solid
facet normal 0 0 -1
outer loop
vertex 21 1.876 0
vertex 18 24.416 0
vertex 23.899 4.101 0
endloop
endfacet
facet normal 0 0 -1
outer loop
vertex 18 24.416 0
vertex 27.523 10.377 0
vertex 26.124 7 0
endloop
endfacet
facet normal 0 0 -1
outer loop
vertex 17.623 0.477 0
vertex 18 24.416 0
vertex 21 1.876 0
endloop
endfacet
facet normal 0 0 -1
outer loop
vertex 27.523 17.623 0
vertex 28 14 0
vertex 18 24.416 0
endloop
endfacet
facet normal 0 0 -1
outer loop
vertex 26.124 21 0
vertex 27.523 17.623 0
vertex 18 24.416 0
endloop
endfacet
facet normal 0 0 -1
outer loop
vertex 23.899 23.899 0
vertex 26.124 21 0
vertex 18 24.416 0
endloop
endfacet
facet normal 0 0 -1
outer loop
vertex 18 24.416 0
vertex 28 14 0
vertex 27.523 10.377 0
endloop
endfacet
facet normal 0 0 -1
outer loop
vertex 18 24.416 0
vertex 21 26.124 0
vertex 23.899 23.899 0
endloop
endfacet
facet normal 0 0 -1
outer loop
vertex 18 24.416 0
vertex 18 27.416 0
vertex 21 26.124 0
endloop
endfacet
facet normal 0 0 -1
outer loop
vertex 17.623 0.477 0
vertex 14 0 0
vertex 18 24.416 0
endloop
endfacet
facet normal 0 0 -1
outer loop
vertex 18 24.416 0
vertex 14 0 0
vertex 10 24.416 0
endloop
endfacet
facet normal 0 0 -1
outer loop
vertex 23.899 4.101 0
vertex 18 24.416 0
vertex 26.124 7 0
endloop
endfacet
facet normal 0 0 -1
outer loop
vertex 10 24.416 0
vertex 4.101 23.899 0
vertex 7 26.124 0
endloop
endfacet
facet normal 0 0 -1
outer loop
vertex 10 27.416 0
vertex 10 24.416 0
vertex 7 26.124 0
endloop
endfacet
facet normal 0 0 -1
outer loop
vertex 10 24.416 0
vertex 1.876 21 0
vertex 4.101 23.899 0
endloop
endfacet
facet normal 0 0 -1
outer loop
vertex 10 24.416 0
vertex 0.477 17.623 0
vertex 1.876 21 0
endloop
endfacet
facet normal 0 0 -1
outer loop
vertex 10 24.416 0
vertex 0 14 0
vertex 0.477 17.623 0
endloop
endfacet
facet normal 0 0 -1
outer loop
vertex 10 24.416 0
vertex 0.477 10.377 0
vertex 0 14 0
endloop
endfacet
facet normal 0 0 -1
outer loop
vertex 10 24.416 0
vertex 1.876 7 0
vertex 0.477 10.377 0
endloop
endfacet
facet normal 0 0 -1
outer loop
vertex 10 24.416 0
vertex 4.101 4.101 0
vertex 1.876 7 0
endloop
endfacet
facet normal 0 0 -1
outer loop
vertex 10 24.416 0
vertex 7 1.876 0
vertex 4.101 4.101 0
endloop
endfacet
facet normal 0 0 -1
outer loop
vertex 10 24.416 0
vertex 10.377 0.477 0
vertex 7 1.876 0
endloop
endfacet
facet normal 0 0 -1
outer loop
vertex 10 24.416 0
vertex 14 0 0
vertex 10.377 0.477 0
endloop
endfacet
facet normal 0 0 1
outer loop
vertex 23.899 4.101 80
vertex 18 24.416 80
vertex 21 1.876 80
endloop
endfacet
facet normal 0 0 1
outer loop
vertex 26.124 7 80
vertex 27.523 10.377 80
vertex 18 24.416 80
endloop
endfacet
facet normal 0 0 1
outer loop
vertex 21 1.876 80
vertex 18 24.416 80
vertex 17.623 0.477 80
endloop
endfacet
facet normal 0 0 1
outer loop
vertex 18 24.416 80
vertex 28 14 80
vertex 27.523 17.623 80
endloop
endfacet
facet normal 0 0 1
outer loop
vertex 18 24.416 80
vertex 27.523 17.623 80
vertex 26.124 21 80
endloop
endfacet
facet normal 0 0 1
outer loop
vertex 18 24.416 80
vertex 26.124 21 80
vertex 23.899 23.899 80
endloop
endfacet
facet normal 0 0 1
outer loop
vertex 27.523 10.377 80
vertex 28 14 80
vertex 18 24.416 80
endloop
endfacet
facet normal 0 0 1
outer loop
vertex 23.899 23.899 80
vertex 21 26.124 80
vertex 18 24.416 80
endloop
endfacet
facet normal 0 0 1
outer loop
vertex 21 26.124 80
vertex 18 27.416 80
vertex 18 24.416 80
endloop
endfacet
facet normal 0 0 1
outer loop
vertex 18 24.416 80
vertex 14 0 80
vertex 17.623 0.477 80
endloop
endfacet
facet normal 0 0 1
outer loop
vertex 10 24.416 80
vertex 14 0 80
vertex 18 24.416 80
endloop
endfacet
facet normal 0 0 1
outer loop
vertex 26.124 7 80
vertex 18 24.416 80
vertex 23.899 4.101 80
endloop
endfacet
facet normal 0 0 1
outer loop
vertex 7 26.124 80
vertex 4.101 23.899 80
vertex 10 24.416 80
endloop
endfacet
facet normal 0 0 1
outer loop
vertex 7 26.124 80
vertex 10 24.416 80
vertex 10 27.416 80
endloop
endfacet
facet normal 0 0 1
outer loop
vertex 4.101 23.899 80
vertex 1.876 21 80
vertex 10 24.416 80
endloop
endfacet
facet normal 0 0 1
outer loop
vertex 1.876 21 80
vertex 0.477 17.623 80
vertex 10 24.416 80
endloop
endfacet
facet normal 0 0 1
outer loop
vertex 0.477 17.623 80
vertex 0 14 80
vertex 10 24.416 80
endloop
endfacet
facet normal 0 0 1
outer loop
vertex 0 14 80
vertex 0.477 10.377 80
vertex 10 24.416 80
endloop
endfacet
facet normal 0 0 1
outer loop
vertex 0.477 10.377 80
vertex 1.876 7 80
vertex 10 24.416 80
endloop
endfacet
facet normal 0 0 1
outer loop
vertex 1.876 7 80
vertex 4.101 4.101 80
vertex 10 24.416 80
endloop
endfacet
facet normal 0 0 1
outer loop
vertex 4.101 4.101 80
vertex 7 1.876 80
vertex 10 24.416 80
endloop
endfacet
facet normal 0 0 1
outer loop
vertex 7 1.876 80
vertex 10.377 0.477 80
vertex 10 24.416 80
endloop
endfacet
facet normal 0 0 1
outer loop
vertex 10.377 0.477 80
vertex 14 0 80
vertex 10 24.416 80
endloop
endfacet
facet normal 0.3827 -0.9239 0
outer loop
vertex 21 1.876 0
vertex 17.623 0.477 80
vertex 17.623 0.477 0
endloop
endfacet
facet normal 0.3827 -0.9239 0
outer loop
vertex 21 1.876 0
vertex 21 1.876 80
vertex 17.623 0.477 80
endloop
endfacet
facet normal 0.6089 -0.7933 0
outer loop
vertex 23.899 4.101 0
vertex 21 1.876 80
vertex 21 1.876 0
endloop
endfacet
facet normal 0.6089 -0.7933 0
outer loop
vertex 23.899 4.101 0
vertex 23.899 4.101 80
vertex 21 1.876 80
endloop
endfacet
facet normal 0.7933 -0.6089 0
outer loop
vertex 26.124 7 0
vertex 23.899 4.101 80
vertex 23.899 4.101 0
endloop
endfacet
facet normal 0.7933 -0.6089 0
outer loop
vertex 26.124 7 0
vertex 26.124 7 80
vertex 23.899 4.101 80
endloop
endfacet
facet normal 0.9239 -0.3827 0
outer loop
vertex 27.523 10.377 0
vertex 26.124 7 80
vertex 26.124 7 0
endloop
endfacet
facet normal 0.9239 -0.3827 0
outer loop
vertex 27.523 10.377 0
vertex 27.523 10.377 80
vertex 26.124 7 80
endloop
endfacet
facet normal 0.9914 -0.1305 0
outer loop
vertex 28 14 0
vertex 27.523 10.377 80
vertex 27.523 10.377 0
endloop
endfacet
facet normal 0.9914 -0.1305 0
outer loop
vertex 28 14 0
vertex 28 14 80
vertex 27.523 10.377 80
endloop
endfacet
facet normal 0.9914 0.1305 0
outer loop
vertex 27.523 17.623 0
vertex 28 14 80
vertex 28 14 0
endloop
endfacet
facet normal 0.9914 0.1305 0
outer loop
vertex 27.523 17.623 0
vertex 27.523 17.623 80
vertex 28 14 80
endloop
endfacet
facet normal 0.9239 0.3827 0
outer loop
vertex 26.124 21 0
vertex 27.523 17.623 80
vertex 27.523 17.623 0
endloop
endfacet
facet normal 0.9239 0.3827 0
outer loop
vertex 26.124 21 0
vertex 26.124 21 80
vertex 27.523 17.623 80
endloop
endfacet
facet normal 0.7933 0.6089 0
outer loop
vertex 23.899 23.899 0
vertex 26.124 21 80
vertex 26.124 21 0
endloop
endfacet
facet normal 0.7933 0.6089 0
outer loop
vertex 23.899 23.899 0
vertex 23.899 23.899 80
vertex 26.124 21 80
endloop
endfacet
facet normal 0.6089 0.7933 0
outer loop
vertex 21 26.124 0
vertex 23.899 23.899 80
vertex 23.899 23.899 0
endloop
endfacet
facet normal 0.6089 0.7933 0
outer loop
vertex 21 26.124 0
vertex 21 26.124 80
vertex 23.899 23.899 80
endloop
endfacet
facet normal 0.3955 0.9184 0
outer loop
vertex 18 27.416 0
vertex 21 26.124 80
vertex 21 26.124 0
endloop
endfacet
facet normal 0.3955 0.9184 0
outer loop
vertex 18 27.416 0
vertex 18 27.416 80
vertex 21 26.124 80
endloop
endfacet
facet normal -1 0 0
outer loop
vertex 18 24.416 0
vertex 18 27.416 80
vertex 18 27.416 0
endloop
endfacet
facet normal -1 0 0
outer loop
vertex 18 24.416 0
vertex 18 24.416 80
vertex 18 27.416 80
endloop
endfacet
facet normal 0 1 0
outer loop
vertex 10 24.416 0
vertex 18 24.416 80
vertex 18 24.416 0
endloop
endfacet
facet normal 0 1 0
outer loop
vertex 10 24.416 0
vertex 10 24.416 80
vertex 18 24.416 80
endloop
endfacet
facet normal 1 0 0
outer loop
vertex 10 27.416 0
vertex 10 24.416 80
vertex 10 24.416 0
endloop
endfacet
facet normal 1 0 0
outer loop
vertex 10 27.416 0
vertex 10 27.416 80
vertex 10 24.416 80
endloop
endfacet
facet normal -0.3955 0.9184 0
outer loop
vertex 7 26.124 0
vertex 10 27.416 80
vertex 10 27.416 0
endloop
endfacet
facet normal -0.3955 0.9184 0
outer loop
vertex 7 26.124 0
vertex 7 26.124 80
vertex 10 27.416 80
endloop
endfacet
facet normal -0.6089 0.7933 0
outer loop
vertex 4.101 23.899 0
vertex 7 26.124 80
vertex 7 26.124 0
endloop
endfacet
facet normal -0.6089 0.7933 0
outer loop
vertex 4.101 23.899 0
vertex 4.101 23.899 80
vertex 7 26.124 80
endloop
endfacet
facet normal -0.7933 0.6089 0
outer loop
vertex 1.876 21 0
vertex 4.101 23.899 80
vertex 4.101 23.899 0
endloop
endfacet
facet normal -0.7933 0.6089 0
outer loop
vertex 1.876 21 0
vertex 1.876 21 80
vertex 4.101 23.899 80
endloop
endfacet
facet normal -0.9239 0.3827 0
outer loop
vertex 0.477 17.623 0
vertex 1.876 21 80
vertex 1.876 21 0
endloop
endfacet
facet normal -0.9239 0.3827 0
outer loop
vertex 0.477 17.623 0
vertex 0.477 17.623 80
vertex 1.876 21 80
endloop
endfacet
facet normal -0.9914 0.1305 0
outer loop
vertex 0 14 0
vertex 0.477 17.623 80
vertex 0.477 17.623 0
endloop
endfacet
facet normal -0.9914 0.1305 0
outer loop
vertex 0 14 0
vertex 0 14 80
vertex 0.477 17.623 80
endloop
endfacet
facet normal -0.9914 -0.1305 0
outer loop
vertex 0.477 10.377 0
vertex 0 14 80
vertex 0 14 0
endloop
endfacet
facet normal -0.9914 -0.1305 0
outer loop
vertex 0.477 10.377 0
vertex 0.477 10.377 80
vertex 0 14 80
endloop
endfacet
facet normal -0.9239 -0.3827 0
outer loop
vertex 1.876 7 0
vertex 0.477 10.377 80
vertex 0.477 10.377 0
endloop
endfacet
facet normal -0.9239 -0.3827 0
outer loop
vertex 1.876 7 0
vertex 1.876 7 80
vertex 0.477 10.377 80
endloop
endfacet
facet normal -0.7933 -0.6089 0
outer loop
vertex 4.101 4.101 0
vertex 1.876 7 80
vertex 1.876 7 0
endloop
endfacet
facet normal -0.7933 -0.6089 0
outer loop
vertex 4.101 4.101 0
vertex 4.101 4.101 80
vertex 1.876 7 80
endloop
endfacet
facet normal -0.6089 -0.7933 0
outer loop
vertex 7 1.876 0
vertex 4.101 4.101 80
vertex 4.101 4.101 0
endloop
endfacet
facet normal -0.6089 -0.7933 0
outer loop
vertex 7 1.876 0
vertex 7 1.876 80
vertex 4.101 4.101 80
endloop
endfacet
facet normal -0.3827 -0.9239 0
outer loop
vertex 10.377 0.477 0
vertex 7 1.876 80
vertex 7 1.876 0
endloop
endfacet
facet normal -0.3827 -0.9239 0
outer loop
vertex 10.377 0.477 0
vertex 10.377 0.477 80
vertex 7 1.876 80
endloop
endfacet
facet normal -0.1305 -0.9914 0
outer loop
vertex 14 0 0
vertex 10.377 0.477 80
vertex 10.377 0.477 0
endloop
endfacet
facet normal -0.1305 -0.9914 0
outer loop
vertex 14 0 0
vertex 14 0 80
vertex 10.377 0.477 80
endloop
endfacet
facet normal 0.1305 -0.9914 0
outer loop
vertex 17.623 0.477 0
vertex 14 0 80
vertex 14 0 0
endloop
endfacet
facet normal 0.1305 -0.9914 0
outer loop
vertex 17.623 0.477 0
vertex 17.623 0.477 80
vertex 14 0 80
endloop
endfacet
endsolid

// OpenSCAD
$fn = 32;

// ----------------------------------------------------------------------
// Keyway shaft: d28 shaft, key 8 x 3 mm
// ----------------------------------------------------------------------

// --- parameters (mm) ---
shaft_r = 14;             // shaft radius
key_w = 8;                // keyway width
key_d = 3;                // keyway depth below the surface line
plate_t = 80;             // shaft length, Z (extrusion height)

shaft_d = 2 * shaft_r;  // shaft diameter
circle_step = 15;  // polygon sampling step, degrees

profile = [[7, 26.124], [4.101, 23.899], [1.876, 21], [0.477, 17.623], [0, 14], [0.477, 10.377], [1.876, 7], [4.101, 4.101], [7, 1.876], [10.377, 0.477], [14, 0], [17.623, 0.477], [21, 1.876], [23.899, 4.101], [26.124, 7], [27.523, 10.377], [28, 14], [27.523, 17.623], [26.124, 21], [23.899, 23.899], [21, 26.124], [18, 27.416], [18, 24.416], [10, 24.416], [10, 27.416]];  // primary outline, 25 points, counter clockwise

// --- the one profile operation ---
linear_extrude(height = plate_t) polygon(points = profile);
